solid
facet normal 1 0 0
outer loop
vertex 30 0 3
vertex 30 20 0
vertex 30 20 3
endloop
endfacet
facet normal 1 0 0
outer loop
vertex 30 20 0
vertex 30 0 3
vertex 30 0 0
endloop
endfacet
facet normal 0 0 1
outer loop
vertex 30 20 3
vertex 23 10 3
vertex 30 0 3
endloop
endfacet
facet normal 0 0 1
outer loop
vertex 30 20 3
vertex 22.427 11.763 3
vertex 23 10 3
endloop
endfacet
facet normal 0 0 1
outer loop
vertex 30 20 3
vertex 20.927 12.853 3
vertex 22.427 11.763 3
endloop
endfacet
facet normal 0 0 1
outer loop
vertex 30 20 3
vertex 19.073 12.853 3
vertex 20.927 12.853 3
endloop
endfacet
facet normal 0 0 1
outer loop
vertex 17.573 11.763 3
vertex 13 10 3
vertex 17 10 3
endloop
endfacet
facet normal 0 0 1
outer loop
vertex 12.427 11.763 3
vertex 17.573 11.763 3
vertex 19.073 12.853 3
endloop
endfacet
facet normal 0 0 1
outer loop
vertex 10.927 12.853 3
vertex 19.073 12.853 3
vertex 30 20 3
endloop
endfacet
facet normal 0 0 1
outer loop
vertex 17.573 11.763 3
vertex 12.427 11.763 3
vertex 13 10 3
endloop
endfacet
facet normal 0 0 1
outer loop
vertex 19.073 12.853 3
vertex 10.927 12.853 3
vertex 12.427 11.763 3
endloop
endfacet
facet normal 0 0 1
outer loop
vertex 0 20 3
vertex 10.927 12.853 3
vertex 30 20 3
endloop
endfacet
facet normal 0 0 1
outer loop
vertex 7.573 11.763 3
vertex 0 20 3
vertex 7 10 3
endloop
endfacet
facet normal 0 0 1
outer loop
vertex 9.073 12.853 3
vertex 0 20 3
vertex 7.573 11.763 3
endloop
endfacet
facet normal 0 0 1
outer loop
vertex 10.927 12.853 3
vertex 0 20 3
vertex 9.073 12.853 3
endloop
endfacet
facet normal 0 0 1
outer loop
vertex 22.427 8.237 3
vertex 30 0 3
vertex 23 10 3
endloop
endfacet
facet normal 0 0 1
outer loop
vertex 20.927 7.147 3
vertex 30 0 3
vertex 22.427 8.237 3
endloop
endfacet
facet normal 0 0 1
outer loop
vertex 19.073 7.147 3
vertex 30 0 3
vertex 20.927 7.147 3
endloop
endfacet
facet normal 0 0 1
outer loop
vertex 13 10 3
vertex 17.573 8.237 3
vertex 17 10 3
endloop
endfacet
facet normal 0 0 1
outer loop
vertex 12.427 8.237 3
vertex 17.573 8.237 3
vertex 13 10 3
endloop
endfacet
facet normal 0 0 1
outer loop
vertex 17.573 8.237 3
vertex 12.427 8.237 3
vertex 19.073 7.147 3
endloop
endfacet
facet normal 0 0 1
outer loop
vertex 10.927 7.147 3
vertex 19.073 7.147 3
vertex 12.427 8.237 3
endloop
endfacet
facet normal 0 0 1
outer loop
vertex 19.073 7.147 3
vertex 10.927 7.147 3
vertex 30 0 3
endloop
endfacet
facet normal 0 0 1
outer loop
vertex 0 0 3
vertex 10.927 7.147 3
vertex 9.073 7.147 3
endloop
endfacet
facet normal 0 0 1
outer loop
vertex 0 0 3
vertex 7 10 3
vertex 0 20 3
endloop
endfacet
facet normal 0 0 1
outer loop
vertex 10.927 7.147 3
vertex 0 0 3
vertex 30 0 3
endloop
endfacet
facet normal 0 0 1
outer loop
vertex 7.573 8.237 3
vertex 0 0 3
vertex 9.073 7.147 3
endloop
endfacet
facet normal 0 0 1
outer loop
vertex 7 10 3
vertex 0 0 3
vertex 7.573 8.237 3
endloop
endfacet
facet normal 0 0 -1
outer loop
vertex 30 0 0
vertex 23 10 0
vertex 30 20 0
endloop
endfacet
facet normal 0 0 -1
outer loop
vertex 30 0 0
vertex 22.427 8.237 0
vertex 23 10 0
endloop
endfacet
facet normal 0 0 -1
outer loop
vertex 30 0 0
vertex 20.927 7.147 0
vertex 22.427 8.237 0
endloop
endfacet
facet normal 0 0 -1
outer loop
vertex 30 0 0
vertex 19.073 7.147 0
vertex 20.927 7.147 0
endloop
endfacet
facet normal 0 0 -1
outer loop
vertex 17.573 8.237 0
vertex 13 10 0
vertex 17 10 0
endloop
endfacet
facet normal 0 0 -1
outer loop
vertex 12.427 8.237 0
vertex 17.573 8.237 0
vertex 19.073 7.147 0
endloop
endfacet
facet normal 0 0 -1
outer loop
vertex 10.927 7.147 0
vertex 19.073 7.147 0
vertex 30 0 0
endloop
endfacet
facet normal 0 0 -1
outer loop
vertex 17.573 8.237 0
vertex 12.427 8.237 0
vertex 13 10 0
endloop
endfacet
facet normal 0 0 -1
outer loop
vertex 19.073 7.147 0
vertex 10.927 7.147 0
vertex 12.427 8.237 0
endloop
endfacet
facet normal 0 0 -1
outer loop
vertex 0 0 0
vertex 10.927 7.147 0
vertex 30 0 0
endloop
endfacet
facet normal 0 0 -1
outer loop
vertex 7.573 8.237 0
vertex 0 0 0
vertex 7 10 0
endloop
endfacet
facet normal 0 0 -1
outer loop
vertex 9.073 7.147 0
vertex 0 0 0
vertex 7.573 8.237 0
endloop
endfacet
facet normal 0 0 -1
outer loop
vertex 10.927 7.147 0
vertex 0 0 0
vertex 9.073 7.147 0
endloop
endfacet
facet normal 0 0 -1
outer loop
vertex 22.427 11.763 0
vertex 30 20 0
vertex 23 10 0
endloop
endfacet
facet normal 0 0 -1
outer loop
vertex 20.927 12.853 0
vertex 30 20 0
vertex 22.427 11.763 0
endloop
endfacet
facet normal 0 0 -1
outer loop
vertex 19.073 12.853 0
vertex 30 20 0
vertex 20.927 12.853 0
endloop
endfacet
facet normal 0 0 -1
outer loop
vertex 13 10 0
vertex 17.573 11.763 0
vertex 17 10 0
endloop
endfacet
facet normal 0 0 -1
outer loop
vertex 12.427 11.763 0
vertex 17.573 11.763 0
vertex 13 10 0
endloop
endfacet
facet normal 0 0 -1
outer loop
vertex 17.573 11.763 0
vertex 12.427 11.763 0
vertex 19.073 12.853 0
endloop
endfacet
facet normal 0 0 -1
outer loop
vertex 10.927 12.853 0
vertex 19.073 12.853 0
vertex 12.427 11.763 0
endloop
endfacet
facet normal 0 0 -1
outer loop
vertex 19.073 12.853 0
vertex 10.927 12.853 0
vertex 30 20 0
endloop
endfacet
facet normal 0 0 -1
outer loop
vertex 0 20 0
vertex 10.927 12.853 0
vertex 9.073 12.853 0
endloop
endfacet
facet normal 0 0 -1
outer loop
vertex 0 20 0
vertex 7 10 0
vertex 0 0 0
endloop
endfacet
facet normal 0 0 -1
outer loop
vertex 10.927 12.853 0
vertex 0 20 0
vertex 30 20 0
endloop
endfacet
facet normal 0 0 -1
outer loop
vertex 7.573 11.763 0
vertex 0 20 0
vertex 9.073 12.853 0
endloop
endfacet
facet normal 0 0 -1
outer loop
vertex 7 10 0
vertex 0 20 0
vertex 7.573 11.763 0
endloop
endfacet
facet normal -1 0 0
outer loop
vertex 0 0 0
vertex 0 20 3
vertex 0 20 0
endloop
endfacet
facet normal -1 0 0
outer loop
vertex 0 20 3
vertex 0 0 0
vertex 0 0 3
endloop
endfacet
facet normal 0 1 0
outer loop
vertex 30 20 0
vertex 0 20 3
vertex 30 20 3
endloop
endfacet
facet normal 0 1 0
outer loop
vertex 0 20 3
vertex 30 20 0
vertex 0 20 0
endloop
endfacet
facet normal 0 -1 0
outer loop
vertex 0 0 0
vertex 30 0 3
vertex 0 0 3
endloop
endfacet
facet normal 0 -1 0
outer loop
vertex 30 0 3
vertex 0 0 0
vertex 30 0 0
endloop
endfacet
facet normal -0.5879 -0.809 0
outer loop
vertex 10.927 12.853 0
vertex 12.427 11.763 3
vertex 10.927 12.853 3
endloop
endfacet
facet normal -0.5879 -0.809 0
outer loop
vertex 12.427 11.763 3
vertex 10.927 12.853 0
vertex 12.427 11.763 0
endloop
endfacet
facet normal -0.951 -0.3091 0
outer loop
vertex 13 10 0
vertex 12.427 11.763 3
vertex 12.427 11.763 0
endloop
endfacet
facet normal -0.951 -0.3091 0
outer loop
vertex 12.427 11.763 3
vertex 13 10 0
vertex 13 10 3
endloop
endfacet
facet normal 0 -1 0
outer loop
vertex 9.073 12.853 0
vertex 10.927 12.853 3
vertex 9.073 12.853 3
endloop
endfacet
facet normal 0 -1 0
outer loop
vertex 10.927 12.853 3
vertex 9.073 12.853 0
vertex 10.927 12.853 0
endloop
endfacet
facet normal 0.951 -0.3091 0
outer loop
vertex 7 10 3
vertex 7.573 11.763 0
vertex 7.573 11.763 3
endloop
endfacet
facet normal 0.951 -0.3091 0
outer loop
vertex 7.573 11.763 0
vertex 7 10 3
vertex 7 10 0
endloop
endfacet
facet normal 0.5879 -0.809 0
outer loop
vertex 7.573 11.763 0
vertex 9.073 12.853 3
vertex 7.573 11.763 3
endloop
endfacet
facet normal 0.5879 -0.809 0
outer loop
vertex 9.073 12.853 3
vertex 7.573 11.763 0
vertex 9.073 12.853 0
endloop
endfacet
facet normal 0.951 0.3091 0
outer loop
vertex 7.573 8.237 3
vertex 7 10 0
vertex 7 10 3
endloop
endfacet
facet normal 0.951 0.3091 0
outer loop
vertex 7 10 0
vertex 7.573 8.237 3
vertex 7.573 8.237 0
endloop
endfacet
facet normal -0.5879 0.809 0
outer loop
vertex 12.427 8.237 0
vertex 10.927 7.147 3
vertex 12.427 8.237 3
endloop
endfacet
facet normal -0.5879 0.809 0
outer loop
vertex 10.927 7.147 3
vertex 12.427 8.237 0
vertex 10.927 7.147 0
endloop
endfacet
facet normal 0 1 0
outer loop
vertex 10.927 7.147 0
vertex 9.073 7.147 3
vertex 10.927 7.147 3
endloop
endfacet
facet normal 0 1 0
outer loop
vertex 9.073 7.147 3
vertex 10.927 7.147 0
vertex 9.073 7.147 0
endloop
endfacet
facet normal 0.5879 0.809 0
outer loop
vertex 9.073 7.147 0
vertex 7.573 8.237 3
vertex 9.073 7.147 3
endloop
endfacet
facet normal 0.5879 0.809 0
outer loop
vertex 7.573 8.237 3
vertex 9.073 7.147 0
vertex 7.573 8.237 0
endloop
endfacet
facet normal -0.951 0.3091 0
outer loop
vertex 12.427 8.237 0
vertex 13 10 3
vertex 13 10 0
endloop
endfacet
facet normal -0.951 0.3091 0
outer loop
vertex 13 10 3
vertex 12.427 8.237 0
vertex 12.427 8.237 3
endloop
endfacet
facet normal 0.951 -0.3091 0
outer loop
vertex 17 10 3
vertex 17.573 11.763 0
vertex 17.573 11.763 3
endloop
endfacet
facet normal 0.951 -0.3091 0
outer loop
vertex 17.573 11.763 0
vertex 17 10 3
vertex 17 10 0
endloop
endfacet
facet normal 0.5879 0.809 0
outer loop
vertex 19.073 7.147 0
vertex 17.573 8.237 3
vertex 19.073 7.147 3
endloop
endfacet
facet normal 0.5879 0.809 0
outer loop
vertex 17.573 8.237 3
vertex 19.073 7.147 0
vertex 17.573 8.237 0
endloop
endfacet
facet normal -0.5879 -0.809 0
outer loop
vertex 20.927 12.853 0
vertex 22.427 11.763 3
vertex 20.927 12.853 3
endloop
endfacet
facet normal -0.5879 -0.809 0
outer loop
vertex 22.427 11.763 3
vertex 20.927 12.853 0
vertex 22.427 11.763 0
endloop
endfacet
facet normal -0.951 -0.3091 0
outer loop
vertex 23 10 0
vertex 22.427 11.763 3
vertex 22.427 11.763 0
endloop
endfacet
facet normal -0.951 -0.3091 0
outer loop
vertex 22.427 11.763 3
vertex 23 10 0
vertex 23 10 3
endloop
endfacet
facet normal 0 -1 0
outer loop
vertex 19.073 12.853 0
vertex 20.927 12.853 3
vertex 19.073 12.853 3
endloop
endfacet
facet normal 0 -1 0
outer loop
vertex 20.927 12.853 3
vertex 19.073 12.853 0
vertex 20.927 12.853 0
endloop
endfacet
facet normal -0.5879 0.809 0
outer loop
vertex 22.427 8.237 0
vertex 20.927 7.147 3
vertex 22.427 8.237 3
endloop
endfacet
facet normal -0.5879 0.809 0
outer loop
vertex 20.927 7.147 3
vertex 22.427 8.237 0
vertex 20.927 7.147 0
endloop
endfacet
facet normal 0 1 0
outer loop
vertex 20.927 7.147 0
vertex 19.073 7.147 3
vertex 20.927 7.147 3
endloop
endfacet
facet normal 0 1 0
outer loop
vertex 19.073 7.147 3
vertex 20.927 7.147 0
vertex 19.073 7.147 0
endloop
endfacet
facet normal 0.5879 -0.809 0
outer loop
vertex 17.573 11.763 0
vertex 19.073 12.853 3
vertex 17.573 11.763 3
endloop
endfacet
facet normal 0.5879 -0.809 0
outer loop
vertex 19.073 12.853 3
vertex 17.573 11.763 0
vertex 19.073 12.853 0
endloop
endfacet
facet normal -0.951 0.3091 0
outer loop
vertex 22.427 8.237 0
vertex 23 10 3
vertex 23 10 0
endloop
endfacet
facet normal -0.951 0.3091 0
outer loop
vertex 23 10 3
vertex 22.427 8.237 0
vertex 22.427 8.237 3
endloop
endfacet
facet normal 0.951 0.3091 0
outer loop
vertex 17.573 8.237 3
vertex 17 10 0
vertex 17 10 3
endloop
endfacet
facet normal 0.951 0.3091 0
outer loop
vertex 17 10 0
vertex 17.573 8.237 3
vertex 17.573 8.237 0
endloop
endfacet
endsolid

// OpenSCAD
// file: sample_lib.scad
module peg(r=2, h=10) {
  cylinder(r=r, h=h);
}

module base_plate(size=[20, 20, 2]) {
  cube(size);
}
// main file
use <sample_lib.scad>;

difference() {
  base_plate(size=[30, 20, 3]);
  translate([10, 10, 0]) cylinder(r=3, h=3);
  translate([20, 10, 0]) cylinder(r=3, h=3);
}
